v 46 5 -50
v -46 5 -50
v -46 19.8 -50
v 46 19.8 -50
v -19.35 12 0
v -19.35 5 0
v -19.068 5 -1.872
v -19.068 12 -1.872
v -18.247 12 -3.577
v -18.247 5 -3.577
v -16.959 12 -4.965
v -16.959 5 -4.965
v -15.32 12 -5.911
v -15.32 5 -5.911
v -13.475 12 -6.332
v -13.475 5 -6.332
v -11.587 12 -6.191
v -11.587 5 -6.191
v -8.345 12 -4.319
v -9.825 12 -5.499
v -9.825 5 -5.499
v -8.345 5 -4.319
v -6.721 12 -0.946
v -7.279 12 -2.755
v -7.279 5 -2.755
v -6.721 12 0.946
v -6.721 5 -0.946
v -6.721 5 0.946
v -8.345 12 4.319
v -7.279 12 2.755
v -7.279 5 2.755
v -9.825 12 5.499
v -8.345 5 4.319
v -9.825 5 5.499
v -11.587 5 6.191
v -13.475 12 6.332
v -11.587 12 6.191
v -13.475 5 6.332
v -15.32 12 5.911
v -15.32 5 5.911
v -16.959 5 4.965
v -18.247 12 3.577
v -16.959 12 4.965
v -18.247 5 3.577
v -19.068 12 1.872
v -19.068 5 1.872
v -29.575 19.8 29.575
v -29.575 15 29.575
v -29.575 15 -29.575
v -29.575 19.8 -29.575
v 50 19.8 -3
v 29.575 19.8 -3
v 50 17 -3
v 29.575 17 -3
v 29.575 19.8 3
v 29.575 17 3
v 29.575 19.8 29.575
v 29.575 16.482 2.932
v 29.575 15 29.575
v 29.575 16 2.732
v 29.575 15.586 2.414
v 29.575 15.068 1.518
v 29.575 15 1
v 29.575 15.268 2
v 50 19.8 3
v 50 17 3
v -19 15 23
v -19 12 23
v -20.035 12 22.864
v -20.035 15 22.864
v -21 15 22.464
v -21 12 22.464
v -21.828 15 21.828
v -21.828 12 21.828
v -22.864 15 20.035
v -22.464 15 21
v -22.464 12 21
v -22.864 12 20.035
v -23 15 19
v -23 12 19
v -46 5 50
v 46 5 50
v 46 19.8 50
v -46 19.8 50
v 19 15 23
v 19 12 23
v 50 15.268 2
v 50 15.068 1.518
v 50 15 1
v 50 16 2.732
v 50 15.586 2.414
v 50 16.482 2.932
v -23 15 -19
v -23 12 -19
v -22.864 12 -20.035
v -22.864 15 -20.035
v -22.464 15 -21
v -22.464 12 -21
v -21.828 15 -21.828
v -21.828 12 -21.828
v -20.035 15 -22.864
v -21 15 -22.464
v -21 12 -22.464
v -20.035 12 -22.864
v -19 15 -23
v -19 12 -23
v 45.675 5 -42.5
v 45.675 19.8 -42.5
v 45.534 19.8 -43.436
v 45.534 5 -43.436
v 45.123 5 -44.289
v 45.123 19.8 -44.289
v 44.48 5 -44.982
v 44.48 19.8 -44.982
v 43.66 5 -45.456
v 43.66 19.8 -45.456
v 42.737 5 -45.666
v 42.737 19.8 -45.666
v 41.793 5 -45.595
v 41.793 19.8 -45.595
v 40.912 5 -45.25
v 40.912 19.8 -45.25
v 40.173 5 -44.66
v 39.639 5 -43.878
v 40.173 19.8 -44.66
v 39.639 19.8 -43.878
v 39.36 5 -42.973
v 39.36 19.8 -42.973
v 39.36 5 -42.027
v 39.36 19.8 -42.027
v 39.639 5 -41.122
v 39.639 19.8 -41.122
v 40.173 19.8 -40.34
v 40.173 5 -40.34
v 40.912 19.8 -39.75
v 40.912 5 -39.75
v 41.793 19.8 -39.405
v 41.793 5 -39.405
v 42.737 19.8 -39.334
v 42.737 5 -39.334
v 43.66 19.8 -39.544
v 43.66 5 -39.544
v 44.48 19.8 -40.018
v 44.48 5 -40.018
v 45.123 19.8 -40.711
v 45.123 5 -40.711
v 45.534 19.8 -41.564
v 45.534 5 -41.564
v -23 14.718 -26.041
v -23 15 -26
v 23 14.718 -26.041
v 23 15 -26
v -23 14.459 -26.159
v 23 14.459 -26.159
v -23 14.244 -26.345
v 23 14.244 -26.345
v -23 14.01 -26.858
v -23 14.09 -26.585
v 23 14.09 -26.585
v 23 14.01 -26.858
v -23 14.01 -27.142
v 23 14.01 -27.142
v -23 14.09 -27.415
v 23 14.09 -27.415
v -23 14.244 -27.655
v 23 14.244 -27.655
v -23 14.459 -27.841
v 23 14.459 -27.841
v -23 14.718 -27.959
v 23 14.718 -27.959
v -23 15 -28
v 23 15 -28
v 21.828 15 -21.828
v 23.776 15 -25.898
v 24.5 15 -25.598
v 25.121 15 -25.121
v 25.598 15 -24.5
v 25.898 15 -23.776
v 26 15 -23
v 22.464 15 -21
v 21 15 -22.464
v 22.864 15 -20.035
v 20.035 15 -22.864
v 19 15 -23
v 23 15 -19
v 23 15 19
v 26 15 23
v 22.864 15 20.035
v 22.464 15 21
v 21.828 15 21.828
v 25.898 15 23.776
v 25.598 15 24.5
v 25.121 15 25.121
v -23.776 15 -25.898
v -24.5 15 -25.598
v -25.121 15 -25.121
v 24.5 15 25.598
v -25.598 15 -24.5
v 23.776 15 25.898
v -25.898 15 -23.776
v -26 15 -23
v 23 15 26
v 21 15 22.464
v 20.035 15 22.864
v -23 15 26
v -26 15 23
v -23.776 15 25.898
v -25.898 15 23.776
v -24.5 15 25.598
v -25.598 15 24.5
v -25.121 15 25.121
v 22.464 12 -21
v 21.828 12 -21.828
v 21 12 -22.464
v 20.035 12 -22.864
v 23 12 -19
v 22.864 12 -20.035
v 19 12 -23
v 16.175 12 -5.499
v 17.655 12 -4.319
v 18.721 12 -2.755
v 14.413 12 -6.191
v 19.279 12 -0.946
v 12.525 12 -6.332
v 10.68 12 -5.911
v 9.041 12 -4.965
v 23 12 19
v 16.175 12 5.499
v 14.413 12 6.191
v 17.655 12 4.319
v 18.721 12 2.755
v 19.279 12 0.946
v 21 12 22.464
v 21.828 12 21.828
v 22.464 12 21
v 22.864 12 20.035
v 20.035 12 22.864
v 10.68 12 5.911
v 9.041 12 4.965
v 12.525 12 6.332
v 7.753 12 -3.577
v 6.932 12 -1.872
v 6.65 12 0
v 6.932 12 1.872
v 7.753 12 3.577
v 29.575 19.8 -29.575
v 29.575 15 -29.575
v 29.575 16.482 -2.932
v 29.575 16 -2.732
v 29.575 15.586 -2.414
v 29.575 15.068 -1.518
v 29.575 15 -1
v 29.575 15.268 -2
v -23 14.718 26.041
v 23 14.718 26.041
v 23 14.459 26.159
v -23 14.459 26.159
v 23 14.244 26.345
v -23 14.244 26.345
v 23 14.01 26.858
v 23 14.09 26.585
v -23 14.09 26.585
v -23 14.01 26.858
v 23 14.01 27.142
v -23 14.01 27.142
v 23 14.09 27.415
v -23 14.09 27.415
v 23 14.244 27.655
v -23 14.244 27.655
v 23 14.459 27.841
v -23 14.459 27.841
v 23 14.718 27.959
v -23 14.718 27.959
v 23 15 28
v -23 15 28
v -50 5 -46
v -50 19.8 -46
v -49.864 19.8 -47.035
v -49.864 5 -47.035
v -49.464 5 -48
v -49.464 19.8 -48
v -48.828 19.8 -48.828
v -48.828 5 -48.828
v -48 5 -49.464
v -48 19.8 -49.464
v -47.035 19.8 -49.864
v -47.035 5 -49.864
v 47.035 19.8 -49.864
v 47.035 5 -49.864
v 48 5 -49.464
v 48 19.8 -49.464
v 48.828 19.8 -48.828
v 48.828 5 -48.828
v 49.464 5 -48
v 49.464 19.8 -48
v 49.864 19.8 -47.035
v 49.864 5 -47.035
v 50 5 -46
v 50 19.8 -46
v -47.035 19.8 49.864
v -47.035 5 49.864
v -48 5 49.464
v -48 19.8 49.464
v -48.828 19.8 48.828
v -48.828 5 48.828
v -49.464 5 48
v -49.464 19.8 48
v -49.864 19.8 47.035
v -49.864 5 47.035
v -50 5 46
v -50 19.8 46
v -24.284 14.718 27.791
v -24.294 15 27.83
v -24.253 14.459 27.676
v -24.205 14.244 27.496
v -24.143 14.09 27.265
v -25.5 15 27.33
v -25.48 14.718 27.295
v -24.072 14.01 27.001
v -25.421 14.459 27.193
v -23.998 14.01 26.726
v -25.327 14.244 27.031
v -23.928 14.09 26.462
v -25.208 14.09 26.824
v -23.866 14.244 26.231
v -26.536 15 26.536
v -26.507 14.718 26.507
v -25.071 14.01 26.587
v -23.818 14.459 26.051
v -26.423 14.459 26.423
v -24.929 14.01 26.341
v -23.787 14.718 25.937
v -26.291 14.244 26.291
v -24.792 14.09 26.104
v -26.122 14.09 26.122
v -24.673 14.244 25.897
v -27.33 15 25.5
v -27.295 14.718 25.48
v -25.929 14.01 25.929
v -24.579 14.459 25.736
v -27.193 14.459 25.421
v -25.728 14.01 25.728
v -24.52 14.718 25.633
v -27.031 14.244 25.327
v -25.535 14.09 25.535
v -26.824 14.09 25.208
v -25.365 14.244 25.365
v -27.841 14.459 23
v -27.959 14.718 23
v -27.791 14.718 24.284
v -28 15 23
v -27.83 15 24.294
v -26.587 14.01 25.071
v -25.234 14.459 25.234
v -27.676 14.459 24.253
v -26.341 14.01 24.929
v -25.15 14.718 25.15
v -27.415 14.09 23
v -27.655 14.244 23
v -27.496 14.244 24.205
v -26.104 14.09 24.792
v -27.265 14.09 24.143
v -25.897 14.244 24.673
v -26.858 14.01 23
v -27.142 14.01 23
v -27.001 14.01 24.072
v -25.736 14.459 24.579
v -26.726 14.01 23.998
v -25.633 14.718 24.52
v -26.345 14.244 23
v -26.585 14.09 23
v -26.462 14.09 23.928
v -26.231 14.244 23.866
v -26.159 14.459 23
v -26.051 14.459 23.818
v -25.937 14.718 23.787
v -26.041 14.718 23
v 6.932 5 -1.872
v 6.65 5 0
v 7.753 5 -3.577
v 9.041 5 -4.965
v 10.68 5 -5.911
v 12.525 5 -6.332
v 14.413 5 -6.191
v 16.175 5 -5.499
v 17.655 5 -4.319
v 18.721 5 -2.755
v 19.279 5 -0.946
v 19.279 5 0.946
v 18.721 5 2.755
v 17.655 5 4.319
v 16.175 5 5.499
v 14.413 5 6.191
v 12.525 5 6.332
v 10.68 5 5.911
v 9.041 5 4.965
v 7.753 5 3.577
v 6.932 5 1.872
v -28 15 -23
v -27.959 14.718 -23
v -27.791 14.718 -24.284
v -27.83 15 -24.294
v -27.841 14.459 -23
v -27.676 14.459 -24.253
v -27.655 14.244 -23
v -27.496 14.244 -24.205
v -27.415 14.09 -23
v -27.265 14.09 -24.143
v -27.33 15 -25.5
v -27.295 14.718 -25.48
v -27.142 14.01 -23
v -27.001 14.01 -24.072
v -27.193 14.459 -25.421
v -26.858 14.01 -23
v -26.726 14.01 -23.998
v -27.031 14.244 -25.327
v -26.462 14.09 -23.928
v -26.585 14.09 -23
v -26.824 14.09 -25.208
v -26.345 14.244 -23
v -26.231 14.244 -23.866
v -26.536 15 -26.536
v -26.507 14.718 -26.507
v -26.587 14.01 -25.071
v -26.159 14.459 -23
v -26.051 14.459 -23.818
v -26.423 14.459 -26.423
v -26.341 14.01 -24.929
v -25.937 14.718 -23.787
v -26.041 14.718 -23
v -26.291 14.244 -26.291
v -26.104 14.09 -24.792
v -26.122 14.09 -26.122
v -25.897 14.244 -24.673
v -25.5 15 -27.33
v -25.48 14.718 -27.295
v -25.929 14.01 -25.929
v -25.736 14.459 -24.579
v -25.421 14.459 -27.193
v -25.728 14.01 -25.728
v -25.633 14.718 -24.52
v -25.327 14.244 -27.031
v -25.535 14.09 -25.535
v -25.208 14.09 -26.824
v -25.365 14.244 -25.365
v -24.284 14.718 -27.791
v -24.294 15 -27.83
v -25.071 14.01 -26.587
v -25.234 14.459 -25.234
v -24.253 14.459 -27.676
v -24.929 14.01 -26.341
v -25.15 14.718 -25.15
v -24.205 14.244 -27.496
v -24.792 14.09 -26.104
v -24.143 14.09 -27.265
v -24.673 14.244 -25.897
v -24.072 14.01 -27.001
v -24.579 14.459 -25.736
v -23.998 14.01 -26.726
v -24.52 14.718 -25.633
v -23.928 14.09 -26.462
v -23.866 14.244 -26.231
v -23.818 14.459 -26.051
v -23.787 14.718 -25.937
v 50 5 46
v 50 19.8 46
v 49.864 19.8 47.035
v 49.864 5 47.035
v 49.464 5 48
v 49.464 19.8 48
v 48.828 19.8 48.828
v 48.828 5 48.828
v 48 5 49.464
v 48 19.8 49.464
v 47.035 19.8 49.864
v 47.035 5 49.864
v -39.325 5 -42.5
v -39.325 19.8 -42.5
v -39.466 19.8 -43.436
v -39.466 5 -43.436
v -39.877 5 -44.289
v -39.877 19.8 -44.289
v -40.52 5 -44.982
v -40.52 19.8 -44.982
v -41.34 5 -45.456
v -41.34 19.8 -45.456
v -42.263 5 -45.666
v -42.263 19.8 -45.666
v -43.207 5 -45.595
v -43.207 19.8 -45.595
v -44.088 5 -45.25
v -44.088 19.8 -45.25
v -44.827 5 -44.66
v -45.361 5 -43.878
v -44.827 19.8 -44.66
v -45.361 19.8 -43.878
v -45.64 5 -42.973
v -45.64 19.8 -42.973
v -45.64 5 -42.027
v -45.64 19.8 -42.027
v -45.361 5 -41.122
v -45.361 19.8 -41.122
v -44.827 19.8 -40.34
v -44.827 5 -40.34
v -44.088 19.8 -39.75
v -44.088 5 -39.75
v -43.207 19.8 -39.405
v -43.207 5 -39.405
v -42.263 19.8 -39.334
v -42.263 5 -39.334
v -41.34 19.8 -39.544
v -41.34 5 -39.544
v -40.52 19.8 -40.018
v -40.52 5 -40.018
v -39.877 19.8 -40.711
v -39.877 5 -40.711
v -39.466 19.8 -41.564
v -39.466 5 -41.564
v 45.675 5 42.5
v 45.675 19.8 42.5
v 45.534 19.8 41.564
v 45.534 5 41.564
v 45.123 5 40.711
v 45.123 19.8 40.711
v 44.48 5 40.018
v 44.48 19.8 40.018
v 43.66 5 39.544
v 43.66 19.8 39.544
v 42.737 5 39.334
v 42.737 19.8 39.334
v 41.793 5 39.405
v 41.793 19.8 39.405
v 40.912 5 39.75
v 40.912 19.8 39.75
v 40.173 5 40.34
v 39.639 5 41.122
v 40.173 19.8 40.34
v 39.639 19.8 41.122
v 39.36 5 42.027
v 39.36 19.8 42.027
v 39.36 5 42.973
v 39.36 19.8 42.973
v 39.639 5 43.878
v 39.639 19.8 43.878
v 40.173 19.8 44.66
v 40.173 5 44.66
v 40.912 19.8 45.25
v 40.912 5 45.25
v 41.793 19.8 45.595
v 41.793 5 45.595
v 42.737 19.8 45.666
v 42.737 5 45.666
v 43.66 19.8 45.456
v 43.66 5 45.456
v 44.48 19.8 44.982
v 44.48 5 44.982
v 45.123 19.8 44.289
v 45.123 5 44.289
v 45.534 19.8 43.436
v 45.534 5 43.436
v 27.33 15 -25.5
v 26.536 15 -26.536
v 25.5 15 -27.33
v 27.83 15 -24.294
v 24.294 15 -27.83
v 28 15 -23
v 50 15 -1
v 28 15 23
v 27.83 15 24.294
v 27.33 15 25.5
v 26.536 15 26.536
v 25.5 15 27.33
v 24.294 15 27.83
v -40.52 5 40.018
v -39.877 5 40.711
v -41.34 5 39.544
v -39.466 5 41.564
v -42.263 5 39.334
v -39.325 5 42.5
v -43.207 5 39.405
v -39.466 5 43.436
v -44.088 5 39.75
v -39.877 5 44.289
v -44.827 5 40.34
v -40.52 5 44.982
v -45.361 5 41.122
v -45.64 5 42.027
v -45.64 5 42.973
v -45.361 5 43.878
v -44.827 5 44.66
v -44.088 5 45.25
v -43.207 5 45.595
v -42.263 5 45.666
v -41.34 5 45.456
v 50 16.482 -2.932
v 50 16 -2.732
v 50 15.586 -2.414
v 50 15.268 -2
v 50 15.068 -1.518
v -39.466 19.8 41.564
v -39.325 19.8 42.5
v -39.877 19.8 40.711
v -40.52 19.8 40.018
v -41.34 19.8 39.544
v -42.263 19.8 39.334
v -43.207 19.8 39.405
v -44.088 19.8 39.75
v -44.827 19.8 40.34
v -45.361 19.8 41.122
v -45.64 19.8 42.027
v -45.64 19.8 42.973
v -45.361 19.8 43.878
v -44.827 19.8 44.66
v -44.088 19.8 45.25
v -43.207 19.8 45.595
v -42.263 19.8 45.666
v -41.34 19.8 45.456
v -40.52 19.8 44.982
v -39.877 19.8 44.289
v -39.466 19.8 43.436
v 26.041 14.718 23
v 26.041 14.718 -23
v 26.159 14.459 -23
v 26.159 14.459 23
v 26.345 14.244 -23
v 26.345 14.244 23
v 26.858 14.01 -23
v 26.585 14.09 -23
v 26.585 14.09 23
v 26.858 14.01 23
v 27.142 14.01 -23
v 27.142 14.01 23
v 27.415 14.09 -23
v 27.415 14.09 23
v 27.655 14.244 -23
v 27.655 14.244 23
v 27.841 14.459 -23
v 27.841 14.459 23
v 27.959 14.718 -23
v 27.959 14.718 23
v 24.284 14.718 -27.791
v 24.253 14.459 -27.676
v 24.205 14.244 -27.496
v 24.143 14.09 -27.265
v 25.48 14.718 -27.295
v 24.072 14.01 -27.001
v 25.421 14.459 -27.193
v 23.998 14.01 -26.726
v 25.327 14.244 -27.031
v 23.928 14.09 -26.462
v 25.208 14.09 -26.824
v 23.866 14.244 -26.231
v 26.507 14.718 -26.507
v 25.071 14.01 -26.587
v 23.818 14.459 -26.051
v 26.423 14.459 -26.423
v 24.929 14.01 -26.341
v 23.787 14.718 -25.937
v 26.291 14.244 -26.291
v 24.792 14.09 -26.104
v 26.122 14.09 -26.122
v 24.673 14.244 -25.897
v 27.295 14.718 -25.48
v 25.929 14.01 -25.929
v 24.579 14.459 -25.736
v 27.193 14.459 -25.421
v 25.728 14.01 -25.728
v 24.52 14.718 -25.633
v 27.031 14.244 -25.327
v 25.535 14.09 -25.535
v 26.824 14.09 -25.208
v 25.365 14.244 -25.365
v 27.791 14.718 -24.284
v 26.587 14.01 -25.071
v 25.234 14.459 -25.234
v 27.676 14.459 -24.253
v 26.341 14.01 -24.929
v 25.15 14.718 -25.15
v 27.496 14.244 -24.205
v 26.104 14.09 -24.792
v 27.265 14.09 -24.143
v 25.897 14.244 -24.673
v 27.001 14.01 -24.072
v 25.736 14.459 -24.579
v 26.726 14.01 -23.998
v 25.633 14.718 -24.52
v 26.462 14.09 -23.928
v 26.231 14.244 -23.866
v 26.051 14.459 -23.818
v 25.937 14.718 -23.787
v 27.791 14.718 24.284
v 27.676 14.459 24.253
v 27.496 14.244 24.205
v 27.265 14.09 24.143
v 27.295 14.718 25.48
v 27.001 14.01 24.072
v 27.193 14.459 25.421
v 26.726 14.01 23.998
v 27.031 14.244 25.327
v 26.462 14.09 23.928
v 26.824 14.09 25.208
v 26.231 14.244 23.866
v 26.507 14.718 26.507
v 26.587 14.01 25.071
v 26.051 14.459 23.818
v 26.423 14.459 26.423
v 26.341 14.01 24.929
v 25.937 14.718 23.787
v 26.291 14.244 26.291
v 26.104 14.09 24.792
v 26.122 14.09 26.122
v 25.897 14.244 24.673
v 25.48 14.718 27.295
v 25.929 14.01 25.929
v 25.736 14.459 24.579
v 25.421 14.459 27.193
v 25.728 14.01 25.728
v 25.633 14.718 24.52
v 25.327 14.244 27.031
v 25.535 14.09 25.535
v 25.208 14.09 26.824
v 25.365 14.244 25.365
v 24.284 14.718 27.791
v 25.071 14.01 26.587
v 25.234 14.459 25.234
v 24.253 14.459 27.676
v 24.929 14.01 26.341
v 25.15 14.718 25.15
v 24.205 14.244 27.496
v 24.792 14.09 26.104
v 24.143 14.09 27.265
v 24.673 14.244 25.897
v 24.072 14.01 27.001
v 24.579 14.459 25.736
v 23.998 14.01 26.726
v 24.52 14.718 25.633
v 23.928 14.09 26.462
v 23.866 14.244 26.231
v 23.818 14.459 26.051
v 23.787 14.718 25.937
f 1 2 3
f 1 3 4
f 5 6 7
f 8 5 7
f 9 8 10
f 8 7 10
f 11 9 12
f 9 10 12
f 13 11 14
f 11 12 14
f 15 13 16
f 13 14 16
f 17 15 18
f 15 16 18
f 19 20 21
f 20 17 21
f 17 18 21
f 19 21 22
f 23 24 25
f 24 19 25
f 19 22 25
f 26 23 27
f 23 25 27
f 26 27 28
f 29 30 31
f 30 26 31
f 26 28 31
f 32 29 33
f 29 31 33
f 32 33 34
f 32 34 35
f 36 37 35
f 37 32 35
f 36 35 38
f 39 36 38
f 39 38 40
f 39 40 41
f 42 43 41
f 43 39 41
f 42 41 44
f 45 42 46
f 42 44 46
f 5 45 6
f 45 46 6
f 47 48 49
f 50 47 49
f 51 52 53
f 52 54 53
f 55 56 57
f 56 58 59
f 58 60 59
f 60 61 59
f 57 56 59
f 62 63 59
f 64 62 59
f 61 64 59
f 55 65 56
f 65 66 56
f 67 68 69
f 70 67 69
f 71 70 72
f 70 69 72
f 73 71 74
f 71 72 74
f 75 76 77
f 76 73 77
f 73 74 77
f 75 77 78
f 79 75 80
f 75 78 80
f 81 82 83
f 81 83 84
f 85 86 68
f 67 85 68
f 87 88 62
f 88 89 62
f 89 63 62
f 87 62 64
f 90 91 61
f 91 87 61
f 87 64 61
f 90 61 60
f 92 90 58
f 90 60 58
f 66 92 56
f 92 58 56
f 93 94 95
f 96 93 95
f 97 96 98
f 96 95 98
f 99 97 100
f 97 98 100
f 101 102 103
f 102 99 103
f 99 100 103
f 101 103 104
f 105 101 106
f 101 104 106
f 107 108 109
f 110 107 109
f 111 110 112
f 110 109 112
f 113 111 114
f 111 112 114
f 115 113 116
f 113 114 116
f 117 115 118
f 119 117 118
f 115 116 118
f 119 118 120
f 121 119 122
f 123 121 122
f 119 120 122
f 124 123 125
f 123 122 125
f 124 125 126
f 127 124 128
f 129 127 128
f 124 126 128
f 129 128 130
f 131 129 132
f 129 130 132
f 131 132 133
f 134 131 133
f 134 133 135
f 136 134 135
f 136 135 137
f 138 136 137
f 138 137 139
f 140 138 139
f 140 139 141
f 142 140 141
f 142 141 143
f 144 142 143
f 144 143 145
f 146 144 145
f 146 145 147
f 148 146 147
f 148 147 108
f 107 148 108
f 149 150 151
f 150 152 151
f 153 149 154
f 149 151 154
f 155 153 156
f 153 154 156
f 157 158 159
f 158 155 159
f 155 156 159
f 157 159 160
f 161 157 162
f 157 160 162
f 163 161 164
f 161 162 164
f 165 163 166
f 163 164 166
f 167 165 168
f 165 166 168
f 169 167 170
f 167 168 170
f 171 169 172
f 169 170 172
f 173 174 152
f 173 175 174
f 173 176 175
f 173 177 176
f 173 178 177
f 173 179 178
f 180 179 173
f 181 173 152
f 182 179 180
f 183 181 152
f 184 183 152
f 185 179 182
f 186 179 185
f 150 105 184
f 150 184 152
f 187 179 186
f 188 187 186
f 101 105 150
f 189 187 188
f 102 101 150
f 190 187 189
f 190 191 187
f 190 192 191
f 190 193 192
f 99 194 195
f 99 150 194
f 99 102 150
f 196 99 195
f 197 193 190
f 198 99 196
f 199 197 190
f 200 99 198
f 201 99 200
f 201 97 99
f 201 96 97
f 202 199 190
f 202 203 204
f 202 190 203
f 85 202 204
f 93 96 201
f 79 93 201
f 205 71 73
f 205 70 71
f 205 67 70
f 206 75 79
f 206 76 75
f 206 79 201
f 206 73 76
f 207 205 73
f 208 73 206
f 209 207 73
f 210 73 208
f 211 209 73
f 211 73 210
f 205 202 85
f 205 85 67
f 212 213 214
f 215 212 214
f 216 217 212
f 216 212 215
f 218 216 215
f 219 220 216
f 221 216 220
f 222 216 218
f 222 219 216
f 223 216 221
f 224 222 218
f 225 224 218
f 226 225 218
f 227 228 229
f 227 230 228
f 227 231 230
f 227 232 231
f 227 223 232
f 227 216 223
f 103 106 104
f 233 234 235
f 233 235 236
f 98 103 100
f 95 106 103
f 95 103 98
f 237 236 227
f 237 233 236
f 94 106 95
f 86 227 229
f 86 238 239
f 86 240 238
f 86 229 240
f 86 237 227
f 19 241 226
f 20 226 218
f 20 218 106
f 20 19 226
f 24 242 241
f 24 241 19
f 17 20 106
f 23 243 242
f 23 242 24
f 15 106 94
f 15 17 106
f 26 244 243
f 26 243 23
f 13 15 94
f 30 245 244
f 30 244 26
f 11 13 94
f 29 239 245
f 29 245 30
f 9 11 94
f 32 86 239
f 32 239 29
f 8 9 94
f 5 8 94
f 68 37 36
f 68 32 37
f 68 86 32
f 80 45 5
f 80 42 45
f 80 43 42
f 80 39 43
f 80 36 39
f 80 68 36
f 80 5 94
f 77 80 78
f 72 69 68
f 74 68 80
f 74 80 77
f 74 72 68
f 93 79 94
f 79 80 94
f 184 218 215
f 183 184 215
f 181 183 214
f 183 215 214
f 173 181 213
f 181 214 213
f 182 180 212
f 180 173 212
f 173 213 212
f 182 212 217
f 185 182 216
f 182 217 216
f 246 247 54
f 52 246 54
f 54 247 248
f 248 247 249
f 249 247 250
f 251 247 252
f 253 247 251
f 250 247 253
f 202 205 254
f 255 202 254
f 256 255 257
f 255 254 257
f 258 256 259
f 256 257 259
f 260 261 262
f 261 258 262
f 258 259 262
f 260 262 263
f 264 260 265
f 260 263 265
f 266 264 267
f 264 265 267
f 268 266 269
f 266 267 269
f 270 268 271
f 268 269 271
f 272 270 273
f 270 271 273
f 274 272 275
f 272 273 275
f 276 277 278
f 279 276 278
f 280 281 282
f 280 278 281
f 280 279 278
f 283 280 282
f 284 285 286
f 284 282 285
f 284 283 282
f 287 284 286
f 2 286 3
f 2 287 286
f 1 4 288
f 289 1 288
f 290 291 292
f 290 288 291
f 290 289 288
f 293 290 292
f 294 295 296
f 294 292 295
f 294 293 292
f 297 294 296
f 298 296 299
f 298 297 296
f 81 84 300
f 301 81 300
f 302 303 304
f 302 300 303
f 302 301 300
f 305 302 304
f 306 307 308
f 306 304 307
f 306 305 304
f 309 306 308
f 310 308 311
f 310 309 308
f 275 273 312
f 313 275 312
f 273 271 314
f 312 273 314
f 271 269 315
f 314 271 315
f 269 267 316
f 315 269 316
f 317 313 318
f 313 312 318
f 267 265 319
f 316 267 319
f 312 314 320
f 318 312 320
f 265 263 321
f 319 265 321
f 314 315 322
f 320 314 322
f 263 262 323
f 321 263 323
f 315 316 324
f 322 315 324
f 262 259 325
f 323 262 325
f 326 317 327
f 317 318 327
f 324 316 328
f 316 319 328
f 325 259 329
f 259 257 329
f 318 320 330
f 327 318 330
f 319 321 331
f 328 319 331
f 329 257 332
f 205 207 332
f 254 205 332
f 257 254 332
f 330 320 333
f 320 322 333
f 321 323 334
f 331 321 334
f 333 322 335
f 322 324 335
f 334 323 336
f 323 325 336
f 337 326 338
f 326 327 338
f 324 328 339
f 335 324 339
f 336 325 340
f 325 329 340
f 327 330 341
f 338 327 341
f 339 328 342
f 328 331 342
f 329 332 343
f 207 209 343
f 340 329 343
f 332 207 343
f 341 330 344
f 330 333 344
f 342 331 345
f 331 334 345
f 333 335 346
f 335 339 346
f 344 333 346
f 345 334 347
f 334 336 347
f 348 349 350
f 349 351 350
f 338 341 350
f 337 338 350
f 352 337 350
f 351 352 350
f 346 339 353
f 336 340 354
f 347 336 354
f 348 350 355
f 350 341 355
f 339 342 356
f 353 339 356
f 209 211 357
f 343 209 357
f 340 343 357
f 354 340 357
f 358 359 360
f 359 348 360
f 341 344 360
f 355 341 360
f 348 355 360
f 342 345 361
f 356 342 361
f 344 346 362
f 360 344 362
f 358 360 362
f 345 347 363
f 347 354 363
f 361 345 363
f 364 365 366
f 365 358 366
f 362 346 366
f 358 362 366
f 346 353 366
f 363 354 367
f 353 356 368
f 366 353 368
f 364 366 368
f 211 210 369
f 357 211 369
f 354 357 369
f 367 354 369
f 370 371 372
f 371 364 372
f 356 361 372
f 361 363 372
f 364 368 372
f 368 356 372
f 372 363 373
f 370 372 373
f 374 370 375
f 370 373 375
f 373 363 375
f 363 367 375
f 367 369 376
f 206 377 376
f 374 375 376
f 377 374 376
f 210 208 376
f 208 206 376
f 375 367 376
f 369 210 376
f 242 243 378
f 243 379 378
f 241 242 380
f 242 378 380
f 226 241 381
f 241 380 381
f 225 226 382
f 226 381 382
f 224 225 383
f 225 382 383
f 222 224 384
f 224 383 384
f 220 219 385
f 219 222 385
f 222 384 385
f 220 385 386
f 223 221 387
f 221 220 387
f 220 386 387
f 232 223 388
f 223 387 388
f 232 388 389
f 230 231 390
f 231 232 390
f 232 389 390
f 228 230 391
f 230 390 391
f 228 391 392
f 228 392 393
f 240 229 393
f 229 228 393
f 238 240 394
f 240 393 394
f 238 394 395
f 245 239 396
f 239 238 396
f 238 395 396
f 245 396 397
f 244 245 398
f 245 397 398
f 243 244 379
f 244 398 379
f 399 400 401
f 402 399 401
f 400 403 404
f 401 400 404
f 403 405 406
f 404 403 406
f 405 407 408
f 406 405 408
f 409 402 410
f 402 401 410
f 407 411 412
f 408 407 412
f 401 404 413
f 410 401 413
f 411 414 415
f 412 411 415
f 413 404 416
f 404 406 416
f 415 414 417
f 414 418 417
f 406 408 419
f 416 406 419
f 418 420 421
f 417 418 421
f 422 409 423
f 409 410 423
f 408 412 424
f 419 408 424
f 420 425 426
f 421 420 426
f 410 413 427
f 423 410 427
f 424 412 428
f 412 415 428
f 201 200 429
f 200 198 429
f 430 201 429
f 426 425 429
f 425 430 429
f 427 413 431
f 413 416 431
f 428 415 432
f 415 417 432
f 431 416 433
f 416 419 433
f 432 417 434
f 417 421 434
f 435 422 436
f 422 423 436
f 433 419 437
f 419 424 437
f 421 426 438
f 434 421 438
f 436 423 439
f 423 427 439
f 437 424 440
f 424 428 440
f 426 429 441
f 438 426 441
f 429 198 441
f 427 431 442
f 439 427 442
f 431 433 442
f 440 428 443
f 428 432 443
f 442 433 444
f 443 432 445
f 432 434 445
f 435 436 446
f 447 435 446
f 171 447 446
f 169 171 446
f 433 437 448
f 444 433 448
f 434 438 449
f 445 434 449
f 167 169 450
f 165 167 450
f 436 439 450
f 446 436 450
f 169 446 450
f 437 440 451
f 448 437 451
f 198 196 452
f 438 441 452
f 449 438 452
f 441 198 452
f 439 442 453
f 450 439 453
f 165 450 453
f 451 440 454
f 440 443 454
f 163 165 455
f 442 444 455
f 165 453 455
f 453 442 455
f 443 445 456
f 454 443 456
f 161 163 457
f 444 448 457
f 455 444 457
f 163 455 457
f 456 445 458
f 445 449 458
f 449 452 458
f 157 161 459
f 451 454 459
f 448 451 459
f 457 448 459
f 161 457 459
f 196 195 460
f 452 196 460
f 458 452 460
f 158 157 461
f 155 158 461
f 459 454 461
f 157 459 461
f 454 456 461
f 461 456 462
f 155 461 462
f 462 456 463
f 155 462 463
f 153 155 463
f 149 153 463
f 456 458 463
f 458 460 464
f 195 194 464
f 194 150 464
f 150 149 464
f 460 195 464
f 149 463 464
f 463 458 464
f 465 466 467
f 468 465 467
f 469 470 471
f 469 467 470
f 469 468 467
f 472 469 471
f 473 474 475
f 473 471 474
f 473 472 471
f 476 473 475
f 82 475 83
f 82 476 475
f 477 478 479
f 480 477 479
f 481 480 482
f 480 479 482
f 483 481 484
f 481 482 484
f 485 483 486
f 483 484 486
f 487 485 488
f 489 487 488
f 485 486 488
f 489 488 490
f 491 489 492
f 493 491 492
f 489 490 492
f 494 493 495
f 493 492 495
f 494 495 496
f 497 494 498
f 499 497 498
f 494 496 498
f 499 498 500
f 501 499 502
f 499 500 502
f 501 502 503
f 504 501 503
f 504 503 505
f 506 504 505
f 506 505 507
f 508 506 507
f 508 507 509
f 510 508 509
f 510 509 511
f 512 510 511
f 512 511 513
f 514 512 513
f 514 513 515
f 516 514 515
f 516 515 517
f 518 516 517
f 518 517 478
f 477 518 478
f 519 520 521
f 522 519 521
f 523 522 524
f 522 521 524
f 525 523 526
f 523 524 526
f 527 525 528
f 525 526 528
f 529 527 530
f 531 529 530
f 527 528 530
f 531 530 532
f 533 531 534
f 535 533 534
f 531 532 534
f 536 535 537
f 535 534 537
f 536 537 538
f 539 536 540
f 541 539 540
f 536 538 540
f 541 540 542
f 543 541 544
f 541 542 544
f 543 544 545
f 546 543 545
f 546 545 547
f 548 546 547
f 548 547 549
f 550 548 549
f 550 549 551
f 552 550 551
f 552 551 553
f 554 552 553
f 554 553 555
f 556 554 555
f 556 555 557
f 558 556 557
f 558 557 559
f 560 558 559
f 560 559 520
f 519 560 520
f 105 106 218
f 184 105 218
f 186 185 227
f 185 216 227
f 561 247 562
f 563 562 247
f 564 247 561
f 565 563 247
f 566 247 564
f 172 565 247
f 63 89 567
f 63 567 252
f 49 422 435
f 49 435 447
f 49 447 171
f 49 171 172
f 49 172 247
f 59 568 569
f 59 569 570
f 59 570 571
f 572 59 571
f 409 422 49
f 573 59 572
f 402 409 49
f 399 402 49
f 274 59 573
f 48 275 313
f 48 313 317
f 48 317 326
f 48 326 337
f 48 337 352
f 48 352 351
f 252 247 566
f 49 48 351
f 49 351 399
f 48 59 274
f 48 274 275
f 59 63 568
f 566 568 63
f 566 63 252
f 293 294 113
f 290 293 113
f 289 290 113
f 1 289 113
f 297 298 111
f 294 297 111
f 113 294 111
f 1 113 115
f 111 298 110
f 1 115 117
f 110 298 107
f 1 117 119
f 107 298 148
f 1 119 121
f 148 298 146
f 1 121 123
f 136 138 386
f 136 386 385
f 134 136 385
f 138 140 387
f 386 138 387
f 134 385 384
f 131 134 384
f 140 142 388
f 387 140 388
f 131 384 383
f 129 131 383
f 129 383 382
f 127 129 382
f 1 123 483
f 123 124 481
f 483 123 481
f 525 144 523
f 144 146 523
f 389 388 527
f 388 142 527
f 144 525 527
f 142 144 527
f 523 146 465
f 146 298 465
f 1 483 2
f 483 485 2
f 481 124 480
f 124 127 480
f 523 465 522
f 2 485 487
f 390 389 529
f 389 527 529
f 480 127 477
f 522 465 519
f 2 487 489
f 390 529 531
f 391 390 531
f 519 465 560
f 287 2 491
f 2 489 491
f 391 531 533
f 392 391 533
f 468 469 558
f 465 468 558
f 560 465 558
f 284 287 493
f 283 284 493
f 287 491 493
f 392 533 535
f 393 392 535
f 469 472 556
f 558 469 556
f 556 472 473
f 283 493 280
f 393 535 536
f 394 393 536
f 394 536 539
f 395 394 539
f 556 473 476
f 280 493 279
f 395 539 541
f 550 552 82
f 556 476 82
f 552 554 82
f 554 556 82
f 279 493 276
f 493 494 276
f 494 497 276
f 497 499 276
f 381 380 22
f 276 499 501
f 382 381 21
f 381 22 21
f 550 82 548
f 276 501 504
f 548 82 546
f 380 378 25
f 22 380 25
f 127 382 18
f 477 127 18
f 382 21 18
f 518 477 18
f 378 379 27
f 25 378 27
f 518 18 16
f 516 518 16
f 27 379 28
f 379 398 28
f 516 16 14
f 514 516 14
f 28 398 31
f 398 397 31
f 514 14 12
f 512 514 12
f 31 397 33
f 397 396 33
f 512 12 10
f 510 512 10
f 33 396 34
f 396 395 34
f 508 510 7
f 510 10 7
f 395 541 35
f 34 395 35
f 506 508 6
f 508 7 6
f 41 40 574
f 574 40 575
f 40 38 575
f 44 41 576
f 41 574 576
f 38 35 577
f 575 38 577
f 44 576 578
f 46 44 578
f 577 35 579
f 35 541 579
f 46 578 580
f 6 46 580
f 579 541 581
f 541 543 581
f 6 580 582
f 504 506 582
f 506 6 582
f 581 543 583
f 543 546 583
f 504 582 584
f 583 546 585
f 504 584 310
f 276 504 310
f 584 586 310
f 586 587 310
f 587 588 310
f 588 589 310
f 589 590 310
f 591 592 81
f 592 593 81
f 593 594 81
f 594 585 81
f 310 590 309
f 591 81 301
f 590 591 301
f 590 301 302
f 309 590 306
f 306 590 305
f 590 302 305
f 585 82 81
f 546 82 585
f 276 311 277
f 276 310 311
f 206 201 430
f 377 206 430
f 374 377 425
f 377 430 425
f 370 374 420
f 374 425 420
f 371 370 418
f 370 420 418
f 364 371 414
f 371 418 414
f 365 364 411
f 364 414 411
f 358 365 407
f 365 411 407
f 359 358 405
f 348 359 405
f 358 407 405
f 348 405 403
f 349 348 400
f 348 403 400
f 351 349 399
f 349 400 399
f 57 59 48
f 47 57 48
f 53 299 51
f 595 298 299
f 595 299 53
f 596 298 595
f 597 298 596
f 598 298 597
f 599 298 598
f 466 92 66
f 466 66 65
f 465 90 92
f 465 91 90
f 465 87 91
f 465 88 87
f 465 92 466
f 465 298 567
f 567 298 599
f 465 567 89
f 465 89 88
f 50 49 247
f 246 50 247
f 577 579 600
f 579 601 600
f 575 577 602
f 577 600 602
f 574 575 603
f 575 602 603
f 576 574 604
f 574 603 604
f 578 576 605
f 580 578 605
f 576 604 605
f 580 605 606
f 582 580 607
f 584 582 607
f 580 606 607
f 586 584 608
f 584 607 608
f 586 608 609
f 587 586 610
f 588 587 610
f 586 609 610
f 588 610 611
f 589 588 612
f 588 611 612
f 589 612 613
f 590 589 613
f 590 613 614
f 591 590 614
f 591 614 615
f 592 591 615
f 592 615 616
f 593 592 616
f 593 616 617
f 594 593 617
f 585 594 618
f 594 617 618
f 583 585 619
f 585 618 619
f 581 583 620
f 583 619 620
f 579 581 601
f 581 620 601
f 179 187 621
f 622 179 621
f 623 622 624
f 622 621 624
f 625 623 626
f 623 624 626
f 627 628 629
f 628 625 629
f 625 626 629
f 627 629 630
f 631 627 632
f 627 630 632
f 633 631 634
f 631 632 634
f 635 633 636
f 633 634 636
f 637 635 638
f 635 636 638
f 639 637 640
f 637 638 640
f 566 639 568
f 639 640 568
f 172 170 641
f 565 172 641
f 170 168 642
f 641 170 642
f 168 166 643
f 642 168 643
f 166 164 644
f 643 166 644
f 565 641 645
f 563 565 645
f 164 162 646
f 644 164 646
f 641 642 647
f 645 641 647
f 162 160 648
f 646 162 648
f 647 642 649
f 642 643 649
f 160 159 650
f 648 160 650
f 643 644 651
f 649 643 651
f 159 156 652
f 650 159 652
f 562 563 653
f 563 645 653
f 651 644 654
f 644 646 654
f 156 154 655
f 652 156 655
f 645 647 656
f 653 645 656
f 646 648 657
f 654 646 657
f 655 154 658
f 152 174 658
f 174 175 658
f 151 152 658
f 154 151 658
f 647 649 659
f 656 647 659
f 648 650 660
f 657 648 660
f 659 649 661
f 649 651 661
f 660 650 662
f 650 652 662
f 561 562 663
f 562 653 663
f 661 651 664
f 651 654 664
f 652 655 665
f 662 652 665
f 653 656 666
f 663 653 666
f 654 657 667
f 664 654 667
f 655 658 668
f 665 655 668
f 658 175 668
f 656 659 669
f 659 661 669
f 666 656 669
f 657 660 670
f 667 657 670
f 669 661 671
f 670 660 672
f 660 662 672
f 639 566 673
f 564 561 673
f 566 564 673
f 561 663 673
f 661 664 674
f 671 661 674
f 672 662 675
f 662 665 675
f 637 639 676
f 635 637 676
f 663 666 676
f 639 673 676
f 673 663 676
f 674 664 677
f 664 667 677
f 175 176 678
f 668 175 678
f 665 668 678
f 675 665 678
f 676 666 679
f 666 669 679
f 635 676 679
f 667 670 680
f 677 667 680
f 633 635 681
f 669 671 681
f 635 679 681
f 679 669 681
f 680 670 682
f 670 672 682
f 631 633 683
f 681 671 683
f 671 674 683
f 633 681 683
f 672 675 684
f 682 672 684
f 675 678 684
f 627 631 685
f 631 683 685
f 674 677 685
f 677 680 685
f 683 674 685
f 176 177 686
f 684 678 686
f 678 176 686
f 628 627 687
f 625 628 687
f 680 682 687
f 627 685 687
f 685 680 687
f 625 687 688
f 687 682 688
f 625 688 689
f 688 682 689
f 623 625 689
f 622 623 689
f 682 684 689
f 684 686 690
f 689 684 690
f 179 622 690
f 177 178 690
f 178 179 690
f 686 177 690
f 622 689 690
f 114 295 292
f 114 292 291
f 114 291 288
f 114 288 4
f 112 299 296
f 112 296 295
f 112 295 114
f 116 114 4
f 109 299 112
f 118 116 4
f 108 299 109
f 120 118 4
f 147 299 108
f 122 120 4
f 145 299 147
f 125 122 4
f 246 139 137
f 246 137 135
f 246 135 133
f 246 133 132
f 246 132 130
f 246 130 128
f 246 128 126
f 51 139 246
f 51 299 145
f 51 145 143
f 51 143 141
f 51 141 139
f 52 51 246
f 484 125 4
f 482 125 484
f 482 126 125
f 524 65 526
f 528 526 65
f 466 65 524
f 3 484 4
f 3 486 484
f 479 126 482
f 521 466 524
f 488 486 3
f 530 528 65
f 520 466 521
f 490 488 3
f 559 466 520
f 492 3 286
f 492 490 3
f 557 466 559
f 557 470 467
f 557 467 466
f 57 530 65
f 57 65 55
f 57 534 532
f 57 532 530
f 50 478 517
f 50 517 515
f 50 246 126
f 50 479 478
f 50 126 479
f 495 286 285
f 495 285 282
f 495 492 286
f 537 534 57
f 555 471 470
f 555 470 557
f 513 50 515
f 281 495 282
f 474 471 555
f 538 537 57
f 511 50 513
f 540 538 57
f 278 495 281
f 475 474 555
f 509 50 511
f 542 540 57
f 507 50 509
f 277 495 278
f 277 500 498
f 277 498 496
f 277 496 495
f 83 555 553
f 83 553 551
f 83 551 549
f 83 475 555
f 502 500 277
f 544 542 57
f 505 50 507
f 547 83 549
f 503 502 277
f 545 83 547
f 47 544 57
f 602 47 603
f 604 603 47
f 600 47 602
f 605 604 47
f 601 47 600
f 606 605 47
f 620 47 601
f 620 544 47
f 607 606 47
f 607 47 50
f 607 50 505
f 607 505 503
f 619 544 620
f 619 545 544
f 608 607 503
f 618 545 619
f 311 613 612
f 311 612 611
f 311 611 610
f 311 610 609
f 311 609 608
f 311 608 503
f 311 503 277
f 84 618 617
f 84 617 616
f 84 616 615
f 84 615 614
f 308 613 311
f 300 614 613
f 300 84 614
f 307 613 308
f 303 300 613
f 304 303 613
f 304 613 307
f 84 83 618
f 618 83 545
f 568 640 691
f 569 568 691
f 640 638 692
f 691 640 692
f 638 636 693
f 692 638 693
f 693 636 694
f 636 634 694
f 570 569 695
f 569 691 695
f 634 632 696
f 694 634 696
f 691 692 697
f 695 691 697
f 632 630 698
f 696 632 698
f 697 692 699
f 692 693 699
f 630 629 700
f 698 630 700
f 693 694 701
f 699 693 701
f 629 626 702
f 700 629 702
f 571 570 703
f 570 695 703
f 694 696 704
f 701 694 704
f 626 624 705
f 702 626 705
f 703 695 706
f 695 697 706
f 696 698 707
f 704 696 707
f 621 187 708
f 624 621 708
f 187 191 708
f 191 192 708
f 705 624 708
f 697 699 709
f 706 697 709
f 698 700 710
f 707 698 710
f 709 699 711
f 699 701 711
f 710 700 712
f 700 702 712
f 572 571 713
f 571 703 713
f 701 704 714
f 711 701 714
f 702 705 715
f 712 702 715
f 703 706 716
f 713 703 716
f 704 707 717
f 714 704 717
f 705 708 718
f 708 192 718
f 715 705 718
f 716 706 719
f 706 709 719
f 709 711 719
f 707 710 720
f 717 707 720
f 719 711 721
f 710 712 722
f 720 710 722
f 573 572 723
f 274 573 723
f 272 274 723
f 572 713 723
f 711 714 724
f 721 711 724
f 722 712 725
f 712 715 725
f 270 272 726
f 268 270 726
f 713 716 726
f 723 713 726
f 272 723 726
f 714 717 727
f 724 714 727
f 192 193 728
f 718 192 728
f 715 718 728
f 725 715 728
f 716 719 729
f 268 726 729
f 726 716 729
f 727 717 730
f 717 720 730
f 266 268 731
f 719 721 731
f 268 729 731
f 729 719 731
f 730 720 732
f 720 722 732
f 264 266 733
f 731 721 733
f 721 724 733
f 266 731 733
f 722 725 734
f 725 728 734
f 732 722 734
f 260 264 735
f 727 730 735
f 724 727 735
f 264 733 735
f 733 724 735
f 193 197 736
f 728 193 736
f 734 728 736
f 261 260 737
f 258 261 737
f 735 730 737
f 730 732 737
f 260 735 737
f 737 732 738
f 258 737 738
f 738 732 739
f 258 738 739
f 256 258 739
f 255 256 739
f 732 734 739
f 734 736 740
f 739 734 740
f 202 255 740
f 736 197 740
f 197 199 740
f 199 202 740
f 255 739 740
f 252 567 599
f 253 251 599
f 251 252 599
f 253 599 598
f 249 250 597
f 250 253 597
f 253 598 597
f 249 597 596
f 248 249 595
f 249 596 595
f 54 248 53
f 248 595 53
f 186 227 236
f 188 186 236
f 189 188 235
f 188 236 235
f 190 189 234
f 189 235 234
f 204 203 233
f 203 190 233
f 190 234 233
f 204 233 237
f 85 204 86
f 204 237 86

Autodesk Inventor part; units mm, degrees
ref_plane "YZ Plane" through (0, 0, 0) normal (1, 0, 0) x (0, 1, 0)
ref_plane "XZ Plane" through (0, 0, 0) normal (0, 1, 0) x (-1, 0, 0)
sketch "peltier" plane through (0, 0, 0) normal (0, 0, 1) x (1, 0, 0)
  line L0 (7.1779, -44.0485) -> (-50.9721, -44.0485)
  line L1 (-50.9721, -44.0485) -> (-50.9721, -102.2985)
  line L2 (-50.9721, -102.2985) -> (7.1779, -102.2985)
  line L3 (7.1779, -102.2985) -> (7.1779, -44.0485)
  point P0 (-21.8971, -73.1735)
  point P1 (-21.8971, -73.1735)
  dimension "d0" = 58.25
  dimension "d1" = 58.15
sketch "Sketch1" plane through (0, 0, 0) normal (0, 1, 0) x (-1, 0, 0)
  line L0 (-46, 50) -> (46, 50)
  line L1 (50, 46) -> (50, -46)
  line L2 (46, -50) -> (-46, -50)
  line L3 (-50, -46) -> (-50, 46)
  line L4 (-50, 50) -> (50, -50) construction
  line L5 (50, 50) -> (-50, -50) construction
  line L6 (-29.575, 29.575) -> (29.575, 29.575)
  line L7 (29.575, 29.575) -> (29.575, -29.575)
  line L8 (29.575, -29.575) -> (-29.575, -29.575)
  line L9 (-29.575, -29.575) -> (-29.575, 29.575)
  line L10 (-29.575, 29.575) -> (29.575, -29.575) construction
  line L11 (29.575, 29.575) -> (-29.575, -29.575) construction
  line L12 (-29.575, 0) -> (-50, 0)
  line L13 (-19, 23) -> (19, 23)
  line L14 (23, 19) -> (23, -19)
  line L15 (19, -23) -> (-19, -23)
  line L16 (-23, -19) -> (-23, 19)
  line L17 (-23, 23) -> (23, -23) construction
  line L18 (23, 23) -> (-23, -23) construction
  arc A0 (50, 46) -> (46, 50) centre (46, 46) ccw
  arc A1 (-46, 50) -> (-50, 46) centre (-46, 46) ccw
  arc A2 (-50, -46) -> (-46, -50) centre (-46, -46) ccw
  arc A3 (46, -50) -> (50, -46) centre (46, -46) ccw
  arc A4 (23, 19) -> (19, 23) centre (19, 19) ccw
  arc A5 (-19, 23) -> (-23, 19) centre (-19, 19) ccw
  arc A6 (-23, -19) -> (-19, -23) centre (-19, -19) ccw
  arc A7 (19, -23) -> (23, -19) centre (19, -19) ccw
  line L19 (-29.575, 0) -> (-29.575, -3)
  line L20 (-29.575, -3) -> (-50, -3)
  line L21 (-50, -3) -> (-50, 3)
  line L22 (-50, 3) -> (-29.575, 3)
  line L23 (-29.575, 3) -> (-29.575, -3)
  circle A8 centre (13, 0) radius 6.35
  circle A9 centre (-13, 0) radius 6.35
  line L24 (29.075, 29.125) -> (-29.075, 29.125)
  line L25 (-29.075, 29.125) -> (-29.075, -29.125)
  line L26 (-29.075, -29.125) -> (29.075, -29.125)
  line L27 (29.075, -29.125) -> (29.075, 29.125)
  point P0 (0, 0)
  point P1 (0, 0)
  dimension "d2" = 100
  dimension "d3" = 100
  dimension "d4" = 0.5
  dimension "d5" = 4
  dimension "d6" = 46
  dimension "d7" = 46
  dimension "d8" = 4
  dimension "d13" = 3
  dimension "d14" = 6
  dimension "d17" = 12.7
  dimension "d18" = 13
  dimension "d19" = 13
  dimension "d20" = 12.7
extrude "Extrusion1" add sketch "Sketch1" along normal blind 20 contours L0 A0 L1 A3 L2 A2 L3 L20 L9 L8 L7 L6 L22 A1
extrude "Extrusion2" add sketch "Sketch1" along normal blind 15 contours L22 L9 L12 L3 | L12 L9 L20 L3 | L9 L6 L7 L8 | L27 L26 L25 L24
extrude "Extrusion3" add sketch "Sketch1" along normal blind 12 contours L13 A4 L14 A7 L15 A6 L16 A5
sketch "Sketch2" plane through (0, 15, 0) normal (0, 1, 0) x (1, 0, 0)
  line L0 (-29.575, -29.575) -> (-29.575, 29.575) projected
  line L1 (29.575, -29.575) -> (-29.575, -29.575) projected
  line L2 (29.575, -3) -> (29.575, -29.575) projected
  line L3 (50, -3) -> (29.575, -3) projected
  line L4 (50, -3) -> (50, 3) projected
  line L5 (29.575, 3) -> (50, 3) projected
  line L6 (29.575, 29.575) -> (29.575, 3) projected
  line L7 (-29.575, 29.575) -> (29.575, 29.575) projected
  line L8 (23, 19) -> (23, -19) projected
  arc A0 (19, -23) -> (23, -19) centre (19, -19) ccw projected
  line L9 (19, -23) -> (-19, -23) projected
  arc A1 (-23, -19) -> (-19, -23) centre (-19, -19) ccw projected
  line L10 (-23, -19) -> (-23, 19) projected
  arc A2 (-19, 23) -> (-23, 19) centre (-19, 19) ccw projected
  line L11 (-19, 23) -> (19, 23) projected
  arc A3 (23, 19) -> (19, 23) centre (19, 19) ccw projected
  line L12 (23, -27) -> (-23, -27)
  line L13 (-27, -23) -> (-27, 23)
  line L14 (-23, 27) -> (23, 27)
  line L15 (27, 23) -> (27, -23)
  line L16 (27, -27) -> (-27, 27) construction
  line L17 (-27, -27) -> (27, 27) construction
  arc A4 (-27, -23) -> (-23, -27) centre (-23, -23) ccw
  arc A5 (-23, 27) -> (-27, 23) centre (-23, 23) ccw
  arc A6 (27, 23) -> (23, 27) centre (23, 23) ccw
  arc A7 (23, -27) -> (27, -23) centre (23, -23) ccw
  point P0 (0, 0)
  dimension "d21" = 4
  dimension "d25" = 4
  dimension "d29" = 4
ref_plane "Work Plane2" through (-27, 15, 23) normal (0, 0, -1) x (-1, 0, 0)
sketch "Sketch4" plane through (-27, 15, 23) normal (0, 0, -1) x (-1, 0, 0)
  circle A0 centre (0, 0) radius 1
  point P0 (-27, -15)
  dimension "d26" = 2
sweep "Sweep2" cut profiles "Sketch4" path "Sketch2" path curves L13 A5 L14 A6 L15 A7 L12 A4
thread "Thread1"
thread "Thread2"
move faces "Move1" translate (0, 5, 0) faces at (-3.5828, 0, -35.3125)
move faces "Move2" translate (0, -0.2, 0) faces at (-43.1917, 20, 9.8583)
fillet "Fillet1" radius 2 2 edges at (39.7875, 15, 3) (39.7875, 15, -3)
sketch "Sketch6" plane through (-46, 19.8, -50) normal (0, 1, 0) x (1, 0, 0)
  line L0 (96, -96) -> (96, -53) projected
  line L1 (96, -53) -> (75.575, -53) projected
  line L2 (75.575, -53) -> (75.575, -79.575) projected
  line L3 (75.575, -79.575) -> (16.425, -79.575) projected
  line L4 (16.425, -79.575) -> (16.425, -20.425) projected
  line L5 (16.425, -20.425) -> (75.575, -20.425) projected
  line L6 (75.575, -20.425) -> (75.575, -47) projected
  line L7 (75.575, -47) -> (96, -47) projected
  line L8 (96, -47) -> (96, -4) projected
  arc A0 (96, -4) -> (92, 0) centre (92, -4) ccw projected
  line L9 (92, 0) -> (0, 0) projected
  arc A1 (0, 0) -> (-4, -4) centre (0, -4) ccw projected
  line L10 (-4, -4) -> (-4, -96) projected
  arc A2 (-4, -96) -> (0, -100) centre (0, -96) ccw projected
  line L11 (0, -100) -> (92, -100) projected
  arc A3 (92, -100) -> (96, -96) centre (92, -96) ccw projected
  line L12 (3.5, -92.5) -> (88.5, -92.5)
  line L13 (88.5, -92.5) -> (88.5, -7.5)
  line L14 (88.5, -7.5) -> (3.5, -7.5)
  line L15 (3.5, -7.5) -> (3.5, -92.5)
  line L16 (3.5, -92.5) -> (88.5, -7.5) construction
  line L17 (88.5, -92.5) -> (3.5, -7.5) construction
  circle A4 centre (3.5, -92.5) radius 3.175
  circle A5 centre (3.5, -7.5) radius 3.175
  circle A6 centre (88.5, -92.5) radius 3.175
  circle A7 centre (88.5, -7.5) radius 3.175
  point P0 (46, -50)
  dimension "d43" = 6.35
  dimension "d45" = 85
  dimension "d46" = 85
  dimension "d49" = 85
  dimension "d52" = 85
extrude "Extrusion4" cut sketch "Sketch6" against normal up to surface (14.8 mm away) contours A6 L12 L13 | L13 L12 A6 | A7 L14 L13 | L13 L14 A7 | A4 L15 L12 | L12 L15 A4 | A5 L15 L14 | L14 L15 A5
properties part number "inf_soporte"
